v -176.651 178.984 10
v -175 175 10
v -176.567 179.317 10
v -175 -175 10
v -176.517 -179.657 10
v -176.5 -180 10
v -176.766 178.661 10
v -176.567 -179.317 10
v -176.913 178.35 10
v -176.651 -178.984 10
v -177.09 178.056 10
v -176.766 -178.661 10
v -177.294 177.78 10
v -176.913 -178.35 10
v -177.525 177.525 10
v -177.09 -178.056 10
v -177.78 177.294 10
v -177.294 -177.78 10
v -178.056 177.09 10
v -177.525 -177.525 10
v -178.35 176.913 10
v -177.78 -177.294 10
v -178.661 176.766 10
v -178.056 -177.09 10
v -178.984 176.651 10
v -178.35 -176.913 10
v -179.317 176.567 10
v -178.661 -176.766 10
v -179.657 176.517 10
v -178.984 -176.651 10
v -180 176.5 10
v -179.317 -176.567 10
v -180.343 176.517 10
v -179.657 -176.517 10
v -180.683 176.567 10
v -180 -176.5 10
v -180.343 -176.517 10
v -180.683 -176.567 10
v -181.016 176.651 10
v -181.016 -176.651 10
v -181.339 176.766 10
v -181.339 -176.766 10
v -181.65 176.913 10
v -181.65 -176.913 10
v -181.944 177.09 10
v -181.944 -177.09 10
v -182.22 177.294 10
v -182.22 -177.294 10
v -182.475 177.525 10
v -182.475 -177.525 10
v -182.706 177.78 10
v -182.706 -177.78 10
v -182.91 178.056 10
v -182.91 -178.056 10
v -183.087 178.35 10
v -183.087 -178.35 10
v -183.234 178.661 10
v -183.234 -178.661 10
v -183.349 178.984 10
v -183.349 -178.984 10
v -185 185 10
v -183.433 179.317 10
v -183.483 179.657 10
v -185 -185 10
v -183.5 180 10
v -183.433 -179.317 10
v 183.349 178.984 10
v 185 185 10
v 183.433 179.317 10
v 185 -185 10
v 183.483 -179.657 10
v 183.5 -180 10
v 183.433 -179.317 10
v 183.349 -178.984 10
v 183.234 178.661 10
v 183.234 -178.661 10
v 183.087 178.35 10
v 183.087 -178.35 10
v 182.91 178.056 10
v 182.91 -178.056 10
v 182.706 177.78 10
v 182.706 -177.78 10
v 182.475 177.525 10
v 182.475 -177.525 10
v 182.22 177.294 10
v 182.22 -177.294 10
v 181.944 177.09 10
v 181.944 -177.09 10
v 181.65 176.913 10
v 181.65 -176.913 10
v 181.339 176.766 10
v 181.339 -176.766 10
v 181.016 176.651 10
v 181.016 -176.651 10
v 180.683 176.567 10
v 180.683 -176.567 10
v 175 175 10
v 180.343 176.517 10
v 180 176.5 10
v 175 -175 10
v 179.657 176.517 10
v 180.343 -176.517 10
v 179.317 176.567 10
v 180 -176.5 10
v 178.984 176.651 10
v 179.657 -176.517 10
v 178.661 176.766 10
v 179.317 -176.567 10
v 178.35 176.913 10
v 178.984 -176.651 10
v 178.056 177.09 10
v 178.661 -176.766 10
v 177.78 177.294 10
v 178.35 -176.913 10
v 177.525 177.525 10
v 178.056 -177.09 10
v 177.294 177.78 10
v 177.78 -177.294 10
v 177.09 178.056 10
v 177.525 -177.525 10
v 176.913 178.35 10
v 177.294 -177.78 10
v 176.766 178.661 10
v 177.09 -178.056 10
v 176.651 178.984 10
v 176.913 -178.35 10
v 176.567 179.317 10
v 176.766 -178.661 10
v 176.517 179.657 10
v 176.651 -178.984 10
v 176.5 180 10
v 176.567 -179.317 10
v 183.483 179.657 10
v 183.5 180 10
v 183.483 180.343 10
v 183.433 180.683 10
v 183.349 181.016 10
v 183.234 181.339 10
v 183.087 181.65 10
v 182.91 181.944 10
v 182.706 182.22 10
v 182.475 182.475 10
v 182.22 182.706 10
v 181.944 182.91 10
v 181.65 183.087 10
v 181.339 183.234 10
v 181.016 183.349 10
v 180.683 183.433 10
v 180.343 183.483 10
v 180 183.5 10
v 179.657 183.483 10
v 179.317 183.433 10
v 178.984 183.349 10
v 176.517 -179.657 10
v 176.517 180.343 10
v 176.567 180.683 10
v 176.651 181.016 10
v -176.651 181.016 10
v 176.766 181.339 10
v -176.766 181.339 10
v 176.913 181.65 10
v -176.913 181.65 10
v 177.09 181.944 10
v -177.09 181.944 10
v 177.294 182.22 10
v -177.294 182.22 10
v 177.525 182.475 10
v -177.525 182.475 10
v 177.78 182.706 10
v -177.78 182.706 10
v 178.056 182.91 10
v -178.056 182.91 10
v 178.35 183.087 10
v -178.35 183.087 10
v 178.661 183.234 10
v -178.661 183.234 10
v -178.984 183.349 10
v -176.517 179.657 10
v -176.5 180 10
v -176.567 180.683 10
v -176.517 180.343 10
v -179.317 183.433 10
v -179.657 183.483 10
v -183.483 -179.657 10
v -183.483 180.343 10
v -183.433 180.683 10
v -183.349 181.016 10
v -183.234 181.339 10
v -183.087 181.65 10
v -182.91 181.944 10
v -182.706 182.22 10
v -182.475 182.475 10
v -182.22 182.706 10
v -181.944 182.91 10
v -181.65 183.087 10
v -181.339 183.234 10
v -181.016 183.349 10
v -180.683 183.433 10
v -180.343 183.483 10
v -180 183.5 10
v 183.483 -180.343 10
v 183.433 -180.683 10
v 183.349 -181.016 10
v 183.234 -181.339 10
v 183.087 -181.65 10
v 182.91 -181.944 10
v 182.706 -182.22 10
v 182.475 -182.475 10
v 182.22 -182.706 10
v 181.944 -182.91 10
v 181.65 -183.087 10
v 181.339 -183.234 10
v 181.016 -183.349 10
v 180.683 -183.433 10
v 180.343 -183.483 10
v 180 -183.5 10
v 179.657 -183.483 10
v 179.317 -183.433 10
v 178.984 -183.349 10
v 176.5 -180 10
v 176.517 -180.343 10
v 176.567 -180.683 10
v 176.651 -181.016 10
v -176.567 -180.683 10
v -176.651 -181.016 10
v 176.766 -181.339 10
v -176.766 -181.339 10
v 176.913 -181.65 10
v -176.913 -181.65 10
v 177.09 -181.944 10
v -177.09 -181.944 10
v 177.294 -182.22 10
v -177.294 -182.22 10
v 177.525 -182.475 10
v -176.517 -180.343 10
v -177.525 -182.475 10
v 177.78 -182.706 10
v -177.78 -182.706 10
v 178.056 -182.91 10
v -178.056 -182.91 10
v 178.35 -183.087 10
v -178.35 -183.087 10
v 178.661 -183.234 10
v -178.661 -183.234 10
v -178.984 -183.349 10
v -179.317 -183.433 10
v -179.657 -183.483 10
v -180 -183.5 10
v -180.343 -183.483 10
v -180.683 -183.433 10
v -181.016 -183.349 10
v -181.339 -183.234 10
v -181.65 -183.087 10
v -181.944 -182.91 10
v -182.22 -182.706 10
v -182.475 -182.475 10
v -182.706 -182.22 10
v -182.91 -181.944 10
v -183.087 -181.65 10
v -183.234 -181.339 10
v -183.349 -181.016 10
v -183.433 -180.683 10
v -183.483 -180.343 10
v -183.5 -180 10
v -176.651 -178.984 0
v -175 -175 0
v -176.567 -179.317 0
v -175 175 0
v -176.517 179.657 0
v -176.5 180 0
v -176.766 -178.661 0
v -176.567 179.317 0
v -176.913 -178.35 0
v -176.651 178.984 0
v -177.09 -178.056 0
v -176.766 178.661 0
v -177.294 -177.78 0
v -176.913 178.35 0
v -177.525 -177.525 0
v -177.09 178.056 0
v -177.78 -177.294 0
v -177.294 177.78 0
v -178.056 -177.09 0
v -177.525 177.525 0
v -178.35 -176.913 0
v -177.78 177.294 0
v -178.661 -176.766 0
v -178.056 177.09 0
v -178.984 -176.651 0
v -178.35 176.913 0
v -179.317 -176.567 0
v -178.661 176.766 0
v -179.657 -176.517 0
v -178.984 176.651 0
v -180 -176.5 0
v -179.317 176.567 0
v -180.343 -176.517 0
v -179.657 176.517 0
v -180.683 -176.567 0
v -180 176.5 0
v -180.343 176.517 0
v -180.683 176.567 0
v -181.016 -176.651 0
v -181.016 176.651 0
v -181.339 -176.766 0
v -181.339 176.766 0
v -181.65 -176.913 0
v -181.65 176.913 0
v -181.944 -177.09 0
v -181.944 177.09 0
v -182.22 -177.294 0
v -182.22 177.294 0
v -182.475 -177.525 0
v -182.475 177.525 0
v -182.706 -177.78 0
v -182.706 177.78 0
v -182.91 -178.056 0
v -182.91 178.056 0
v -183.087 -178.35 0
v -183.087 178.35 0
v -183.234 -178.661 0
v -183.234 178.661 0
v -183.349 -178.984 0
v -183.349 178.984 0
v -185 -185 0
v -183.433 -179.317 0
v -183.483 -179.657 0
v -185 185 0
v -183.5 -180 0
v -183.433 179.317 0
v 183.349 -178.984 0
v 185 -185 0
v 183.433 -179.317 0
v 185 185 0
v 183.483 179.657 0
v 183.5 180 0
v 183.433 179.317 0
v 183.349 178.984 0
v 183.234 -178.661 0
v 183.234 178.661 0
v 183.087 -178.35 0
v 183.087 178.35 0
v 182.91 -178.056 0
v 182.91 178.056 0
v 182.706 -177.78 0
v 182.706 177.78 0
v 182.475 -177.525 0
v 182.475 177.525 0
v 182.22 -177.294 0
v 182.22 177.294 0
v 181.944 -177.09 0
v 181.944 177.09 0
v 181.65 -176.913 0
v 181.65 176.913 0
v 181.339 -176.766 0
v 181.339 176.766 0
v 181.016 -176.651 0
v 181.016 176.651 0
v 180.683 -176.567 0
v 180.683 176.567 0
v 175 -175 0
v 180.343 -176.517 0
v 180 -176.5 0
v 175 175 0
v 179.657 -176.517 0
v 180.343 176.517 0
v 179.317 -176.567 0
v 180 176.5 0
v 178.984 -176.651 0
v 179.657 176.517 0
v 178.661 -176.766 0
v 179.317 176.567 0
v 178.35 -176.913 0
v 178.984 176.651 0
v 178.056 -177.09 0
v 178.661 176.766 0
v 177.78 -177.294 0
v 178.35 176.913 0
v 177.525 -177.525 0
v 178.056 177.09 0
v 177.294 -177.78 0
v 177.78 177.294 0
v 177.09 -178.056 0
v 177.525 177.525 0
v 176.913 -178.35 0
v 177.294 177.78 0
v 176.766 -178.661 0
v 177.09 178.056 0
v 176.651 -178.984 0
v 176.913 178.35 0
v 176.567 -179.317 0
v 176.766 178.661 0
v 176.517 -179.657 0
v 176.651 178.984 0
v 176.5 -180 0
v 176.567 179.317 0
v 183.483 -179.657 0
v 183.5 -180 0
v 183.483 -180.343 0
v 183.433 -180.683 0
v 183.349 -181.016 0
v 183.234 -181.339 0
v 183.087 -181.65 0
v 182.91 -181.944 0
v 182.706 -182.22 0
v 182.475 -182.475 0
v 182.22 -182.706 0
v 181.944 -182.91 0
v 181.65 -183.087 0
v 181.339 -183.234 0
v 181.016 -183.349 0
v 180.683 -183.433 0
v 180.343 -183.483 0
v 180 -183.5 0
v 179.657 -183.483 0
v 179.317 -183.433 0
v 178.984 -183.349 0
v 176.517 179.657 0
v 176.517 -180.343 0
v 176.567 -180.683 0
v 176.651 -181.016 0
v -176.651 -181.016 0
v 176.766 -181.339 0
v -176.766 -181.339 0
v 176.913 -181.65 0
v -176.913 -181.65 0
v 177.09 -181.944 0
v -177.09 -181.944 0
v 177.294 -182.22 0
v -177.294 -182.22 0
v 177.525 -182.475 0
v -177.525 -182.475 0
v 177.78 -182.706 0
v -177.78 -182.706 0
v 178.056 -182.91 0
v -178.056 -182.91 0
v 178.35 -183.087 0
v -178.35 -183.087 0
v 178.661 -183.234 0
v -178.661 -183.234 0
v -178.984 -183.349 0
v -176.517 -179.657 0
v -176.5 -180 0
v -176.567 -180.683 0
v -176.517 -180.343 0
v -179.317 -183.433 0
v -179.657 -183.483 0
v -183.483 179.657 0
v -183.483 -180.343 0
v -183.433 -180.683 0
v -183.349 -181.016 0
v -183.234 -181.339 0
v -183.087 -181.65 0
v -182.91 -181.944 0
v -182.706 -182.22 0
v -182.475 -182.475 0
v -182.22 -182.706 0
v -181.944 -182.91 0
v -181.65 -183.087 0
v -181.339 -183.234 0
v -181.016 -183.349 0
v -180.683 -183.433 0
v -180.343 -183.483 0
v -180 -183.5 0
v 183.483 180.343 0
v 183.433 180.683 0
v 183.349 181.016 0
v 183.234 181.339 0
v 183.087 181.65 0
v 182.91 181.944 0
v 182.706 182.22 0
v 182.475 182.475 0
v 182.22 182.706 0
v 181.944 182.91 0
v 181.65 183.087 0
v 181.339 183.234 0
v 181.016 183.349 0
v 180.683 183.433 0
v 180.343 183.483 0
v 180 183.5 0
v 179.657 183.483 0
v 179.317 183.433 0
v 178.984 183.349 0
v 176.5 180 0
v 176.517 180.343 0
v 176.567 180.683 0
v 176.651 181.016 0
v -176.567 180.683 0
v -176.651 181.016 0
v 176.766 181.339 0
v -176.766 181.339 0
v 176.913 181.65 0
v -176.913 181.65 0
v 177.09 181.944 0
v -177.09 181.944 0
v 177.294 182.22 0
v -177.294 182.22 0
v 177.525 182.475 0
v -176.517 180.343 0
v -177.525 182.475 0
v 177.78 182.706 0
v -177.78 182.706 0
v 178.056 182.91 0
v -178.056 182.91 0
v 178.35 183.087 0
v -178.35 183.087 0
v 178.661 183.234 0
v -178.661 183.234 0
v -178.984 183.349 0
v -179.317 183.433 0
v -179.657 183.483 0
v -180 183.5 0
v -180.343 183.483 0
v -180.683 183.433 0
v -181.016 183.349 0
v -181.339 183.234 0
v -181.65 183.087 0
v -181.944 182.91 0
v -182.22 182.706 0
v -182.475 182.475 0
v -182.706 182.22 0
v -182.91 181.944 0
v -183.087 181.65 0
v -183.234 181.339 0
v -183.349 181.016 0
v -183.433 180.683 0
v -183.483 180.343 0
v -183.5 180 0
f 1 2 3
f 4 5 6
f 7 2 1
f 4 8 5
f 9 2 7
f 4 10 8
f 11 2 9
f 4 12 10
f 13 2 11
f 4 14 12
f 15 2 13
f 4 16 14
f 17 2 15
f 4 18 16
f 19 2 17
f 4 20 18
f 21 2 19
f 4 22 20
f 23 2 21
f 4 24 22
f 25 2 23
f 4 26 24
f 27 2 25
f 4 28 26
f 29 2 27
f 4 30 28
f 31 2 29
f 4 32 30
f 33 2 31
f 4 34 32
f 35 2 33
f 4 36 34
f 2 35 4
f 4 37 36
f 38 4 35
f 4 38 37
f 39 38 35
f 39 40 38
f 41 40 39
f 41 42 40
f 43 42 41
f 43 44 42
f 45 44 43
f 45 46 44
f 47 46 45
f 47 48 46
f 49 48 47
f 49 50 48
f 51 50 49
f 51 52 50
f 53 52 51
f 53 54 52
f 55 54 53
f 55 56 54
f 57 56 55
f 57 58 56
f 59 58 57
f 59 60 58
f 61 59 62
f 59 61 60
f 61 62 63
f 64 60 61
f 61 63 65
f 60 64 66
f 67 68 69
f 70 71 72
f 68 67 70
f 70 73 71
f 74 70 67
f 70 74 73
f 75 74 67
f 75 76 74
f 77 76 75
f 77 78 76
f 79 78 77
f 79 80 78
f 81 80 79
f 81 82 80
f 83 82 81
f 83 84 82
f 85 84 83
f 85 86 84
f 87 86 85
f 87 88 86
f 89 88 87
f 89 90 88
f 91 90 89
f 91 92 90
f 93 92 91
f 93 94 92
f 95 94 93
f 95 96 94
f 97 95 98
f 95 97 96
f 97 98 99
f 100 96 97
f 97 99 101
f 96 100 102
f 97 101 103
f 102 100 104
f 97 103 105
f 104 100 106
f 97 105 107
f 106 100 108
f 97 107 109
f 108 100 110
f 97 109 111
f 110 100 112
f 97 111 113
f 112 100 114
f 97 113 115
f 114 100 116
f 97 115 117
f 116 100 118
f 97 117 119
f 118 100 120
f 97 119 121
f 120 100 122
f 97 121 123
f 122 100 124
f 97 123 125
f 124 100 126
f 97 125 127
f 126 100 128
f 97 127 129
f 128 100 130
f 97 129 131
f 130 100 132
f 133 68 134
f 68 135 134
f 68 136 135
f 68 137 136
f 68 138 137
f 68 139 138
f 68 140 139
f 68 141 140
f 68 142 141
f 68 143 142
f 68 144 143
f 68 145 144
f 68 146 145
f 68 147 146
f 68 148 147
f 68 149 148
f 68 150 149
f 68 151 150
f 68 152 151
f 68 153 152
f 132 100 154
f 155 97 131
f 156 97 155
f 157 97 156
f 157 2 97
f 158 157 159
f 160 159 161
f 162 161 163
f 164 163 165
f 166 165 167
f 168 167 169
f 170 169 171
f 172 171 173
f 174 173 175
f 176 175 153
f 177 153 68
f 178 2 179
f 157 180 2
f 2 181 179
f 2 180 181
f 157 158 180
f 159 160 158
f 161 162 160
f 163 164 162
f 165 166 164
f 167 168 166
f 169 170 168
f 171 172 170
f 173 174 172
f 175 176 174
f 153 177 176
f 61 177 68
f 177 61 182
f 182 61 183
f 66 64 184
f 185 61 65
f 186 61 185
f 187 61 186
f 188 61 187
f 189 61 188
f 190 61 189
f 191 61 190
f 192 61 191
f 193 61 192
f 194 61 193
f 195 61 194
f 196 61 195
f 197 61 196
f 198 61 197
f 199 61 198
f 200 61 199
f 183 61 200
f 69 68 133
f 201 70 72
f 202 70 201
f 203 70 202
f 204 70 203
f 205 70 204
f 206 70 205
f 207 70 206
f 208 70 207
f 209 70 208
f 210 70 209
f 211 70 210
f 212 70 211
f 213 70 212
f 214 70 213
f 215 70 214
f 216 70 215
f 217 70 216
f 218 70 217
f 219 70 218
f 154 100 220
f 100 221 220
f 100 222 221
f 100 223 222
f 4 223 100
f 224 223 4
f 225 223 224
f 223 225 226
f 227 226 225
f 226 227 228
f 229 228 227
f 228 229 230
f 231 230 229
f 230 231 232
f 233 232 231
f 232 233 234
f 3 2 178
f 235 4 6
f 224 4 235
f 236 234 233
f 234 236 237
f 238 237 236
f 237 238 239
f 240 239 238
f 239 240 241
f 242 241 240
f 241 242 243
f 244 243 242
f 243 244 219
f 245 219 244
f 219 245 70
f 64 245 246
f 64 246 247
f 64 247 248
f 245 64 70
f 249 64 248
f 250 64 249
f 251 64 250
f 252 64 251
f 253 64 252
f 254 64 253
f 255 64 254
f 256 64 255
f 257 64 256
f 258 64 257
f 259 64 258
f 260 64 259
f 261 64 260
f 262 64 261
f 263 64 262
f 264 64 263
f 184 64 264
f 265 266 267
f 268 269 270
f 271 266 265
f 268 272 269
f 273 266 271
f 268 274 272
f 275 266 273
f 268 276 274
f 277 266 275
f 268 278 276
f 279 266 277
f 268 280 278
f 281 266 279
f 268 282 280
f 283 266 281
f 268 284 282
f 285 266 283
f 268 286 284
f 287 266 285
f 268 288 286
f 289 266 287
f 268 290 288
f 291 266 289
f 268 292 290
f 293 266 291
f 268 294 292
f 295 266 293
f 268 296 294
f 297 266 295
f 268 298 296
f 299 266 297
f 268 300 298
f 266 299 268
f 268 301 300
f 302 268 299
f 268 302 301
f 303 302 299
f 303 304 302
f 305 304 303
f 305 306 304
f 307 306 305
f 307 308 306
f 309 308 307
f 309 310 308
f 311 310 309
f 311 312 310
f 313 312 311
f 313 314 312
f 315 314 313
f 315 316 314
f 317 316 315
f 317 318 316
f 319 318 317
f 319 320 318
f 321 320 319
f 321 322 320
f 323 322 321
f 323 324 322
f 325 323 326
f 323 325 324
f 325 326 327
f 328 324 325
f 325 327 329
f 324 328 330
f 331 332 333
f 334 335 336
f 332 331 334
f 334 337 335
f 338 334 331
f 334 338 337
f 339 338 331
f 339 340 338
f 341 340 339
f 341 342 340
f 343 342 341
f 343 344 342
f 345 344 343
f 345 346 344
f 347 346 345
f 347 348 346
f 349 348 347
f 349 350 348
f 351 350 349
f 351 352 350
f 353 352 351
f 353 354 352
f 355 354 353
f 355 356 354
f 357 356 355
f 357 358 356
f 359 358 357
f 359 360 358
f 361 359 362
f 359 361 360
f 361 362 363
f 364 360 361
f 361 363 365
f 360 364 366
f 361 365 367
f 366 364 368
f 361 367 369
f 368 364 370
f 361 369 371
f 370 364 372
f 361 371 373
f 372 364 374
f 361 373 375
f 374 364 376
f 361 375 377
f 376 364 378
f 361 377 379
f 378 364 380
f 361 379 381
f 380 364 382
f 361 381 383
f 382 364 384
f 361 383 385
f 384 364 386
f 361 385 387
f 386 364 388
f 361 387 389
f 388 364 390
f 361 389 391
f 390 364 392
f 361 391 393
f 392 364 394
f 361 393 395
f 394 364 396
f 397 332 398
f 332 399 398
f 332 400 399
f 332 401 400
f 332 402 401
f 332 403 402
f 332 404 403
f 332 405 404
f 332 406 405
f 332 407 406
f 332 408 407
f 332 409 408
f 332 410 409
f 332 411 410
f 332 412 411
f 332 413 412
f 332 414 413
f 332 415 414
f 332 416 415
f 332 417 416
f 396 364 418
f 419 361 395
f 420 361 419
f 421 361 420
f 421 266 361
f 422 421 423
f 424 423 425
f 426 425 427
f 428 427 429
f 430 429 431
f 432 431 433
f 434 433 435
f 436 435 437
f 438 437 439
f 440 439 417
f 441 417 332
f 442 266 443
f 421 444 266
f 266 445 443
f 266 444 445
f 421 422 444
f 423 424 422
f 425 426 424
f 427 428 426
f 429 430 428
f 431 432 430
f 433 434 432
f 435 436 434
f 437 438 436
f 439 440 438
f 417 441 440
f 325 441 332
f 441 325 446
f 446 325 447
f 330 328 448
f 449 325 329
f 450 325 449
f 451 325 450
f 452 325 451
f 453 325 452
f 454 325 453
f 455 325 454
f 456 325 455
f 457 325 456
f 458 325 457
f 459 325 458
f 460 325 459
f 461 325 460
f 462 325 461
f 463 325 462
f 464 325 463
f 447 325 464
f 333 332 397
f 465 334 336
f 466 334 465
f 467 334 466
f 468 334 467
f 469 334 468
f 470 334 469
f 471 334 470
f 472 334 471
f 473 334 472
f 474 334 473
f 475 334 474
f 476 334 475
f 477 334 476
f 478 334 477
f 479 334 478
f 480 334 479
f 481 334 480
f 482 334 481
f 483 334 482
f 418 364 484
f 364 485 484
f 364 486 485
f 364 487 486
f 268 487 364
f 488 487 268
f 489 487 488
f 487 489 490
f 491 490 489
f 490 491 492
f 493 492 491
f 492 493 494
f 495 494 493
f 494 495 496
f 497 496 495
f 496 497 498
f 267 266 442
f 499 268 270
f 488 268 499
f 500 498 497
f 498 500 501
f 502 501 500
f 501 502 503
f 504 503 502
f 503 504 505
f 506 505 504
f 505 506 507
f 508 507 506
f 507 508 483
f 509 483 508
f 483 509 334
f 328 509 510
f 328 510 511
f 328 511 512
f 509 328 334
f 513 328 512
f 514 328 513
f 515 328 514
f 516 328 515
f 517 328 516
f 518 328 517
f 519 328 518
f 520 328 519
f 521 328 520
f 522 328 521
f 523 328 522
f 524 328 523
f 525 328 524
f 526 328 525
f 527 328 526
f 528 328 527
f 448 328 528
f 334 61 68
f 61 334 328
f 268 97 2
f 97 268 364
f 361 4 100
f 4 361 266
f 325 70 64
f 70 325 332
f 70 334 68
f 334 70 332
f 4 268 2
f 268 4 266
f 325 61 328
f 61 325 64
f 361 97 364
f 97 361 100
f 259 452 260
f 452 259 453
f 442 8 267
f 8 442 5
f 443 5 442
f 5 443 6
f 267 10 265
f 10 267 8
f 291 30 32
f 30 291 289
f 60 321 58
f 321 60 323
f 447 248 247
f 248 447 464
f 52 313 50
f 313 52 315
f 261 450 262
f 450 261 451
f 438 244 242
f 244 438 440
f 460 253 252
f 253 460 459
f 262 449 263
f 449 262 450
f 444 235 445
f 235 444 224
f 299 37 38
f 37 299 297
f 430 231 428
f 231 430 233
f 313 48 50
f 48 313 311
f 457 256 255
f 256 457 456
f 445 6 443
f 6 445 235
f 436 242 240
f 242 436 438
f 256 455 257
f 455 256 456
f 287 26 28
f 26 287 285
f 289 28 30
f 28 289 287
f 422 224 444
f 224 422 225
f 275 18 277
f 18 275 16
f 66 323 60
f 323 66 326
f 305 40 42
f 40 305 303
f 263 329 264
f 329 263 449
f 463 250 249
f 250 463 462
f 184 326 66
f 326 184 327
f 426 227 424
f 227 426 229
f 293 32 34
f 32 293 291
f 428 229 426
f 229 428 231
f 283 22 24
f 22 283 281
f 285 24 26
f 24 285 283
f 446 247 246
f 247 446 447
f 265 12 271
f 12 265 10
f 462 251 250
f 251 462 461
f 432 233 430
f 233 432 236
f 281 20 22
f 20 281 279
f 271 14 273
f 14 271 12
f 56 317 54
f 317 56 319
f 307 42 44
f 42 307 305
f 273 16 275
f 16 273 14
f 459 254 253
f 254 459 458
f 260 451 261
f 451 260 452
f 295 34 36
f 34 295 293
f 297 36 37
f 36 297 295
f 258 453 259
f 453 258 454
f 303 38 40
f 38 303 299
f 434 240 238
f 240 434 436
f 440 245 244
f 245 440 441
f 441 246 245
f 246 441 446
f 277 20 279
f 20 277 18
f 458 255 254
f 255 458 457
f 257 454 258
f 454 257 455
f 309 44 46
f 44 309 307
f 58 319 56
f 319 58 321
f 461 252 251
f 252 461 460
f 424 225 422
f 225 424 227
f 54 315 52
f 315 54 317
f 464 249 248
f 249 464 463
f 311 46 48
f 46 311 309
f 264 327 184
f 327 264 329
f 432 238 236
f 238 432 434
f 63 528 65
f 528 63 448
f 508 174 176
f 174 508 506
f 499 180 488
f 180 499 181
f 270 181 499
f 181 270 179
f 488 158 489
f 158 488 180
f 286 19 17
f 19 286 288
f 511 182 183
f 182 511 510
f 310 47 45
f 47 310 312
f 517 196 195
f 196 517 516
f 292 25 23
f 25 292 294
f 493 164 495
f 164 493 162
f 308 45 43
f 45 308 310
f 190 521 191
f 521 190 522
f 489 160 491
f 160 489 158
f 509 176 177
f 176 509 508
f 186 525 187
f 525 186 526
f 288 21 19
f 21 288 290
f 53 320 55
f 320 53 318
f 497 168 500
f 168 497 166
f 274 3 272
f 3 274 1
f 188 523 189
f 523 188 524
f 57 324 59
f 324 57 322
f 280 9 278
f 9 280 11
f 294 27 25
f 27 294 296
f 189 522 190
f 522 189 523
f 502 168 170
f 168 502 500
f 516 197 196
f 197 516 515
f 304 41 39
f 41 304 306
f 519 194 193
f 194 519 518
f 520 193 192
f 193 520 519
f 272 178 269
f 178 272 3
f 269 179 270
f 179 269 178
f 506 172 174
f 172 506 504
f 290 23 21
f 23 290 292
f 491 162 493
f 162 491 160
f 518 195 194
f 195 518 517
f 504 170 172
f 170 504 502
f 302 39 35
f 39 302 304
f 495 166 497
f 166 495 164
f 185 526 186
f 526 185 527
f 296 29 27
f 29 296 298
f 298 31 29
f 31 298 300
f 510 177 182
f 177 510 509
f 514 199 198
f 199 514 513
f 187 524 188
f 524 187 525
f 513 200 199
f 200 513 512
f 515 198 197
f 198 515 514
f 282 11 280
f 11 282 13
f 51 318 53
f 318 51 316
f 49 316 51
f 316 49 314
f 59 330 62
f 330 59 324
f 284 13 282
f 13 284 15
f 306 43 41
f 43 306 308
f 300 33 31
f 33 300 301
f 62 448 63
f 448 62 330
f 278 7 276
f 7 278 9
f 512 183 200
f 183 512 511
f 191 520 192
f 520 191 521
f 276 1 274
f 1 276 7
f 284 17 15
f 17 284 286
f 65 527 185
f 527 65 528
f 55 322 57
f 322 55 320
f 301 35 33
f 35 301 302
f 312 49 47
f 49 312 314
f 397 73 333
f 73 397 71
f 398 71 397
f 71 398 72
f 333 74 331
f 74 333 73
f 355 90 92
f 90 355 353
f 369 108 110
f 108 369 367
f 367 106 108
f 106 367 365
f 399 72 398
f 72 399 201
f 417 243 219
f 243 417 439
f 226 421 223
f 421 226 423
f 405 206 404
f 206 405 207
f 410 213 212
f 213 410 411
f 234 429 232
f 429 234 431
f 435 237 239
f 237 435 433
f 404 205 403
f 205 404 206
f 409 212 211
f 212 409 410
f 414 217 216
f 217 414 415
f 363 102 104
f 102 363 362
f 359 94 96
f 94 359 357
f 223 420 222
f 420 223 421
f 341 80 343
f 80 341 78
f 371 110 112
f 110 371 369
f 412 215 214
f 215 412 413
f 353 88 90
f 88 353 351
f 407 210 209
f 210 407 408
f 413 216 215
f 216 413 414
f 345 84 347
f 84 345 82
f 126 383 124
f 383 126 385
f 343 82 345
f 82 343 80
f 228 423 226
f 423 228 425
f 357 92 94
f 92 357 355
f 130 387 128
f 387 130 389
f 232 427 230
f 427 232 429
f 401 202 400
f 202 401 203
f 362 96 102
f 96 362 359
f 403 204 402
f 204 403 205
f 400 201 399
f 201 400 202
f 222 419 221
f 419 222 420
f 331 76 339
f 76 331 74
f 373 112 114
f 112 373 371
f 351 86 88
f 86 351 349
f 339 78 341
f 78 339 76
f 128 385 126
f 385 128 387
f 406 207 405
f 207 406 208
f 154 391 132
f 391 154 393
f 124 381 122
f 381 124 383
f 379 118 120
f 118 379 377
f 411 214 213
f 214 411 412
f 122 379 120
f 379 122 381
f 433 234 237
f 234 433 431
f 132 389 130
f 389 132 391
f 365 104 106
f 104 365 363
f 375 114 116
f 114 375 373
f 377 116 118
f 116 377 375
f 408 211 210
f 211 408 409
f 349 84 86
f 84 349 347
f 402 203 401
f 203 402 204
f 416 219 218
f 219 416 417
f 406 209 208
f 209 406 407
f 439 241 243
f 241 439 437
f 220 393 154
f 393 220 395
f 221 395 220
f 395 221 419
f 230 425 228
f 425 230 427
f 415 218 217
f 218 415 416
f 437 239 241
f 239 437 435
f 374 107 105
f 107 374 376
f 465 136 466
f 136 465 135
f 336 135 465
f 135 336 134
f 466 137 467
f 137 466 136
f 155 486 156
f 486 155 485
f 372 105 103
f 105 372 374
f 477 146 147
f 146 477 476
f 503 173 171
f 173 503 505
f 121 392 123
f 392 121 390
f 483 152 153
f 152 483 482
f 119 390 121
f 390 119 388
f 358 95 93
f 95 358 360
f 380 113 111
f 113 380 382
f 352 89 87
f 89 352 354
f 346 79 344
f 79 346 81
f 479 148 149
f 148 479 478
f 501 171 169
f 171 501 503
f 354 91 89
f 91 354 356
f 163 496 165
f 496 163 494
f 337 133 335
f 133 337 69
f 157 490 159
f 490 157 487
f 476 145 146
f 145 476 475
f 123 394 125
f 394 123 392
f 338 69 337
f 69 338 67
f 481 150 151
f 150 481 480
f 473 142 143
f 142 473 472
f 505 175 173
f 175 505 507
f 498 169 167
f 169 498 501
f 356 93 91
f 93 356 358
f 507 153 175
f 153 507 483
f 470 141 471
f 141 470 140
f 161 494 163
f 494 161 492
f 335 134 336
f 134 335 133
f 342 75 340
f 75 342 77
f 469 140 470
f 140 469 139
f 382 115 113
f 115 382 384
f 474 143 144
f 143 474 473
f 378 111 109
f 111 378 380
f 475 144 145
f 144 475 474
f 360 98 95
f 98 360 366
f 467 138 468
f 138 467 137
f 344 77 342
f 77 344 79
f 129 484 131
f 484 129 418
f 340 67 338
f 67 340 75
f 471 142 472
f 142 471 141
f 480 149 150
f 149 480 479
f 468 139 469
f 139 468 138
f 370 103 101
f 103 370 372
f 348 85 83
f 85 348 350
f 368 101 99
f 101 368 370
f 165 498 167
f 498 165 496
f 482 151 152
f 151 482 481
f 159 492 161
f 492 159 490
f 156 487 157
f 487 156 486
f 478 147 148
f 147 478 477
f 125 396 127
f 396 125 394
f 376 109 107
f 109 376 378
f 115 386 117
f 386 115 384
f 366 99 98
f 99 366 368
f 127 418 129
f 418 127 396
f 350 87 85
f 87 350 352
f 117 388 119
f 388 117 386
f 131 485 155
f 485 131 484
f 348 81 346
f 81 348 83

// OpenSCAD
// ring_50.scad - ring index 50 (z bottom = 500 mm)
$fn = 64; bar = 10; half_b = bar/2; outer = 370; half_outer = outer/2;
front_y = 180; back_y = -180; left_x = -180; right_x = 180;
x_centers = [-170, -100, -30, 40, 110, 180];
z_centers = [5, 85, 155, 225, 295, 365, 435, 505, 575, 645, 715]; ring_z = 500;
module place_box(cx, cy, sx, sy) { translate([cx - sx/2, cy - sy/2, 0]) cube([sx, sy, bar]); }

difference() { union() {
    for (x = x_centers) { place_box(x, front_y, bar, bar); place_box(x, back_y, bar, bar); }
    for (y = x_centers) { place_box(left_x, y, bar, bar); place_box(right_x, y, bar, bar); }
    for (zc = z_centers) if ((zc - half_b < ring_z + bar) && (zc + half_b > ring_z)) {
        translate([-half_outer, front_y - half_b, 0]) cube([outer, bar, bar]);
        translate([-half_outer, back_y - half_b, 0])  cube([outer, bar, bar]);
        translate([left_x - half_b, -half_outer, 0])  cube([bar, outer, bar]);
        translate([right_x - half_b, -half_outer, 0]) cube([bar, outer, bar]);
    }
  }
  for (cx = [-180, 180]) for (cy = [-180, 180]) translate([cx, cy, 0]) cylinder(h = bar, r = 3.5, $fn = 64);
}
